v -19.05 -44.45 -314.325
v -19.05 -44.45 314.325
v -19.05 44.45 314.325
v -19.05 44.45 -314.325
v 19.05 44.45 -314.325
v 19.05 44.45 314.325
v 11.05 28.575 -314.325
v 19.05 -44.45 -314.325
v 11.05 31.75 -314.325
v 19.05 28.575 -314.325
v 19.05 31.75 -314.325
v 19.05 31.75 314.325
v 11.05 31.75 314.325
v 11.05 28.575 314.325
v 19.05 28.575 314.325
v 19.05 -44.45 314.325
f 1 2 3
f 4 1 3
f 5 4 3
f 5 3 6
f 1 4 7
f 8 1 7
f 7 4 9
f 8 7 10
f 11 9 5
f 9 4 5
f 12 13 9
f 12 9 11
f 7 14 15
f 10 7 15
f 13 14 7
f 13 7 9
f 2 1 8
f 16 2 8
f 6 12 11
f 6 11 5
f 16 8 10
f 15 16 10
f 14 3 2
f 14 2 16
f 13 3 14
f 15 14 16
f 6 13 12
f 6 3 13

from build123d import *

# Parameters (mm, degrees)
SKETCH1_W               = 38.1
SKETCH1_H               = 88.9
BOSS_EXTRUDE1_DEPTH     = 314.325
SKETCH2_W               = 8
SKETCH2_H               = 3.175
CUT_EXTRUDE1_DEPTH      = 315.325
CUT_EXTRUDE1_DEPTH_BACK = 315.325


with BuildPart() as part:
    # Sketch1 → Boss-Extrude1 (new body, symmetric)
    with BuildSketch(Plane.XY):
        Rectangle(SKETCH1_W, SKETCH1_H)
    extrude(amount=BOSS_EXTRUDE1_DEPTH, both=True)

    # Sketch2 → Cut-Extrude1 (cut, two sides)
    with BuildSketch(Plane.XY) as cut_extrude1_sk:
        with Locations((15.05, 30.1625)):
            Rectangle(SKETCH2_W, SKETCH2_H)
    extrude(amount=CUT_EXTRUDE1_DEPTH, mode=Mode.SUBTRACT)
    extrude(cut_extrude1_sk.sketch, amount=-CUT_EXTRUDE1_DEPTH_BACK, mode=Mode.SUBTRACT)


solid = part.part
